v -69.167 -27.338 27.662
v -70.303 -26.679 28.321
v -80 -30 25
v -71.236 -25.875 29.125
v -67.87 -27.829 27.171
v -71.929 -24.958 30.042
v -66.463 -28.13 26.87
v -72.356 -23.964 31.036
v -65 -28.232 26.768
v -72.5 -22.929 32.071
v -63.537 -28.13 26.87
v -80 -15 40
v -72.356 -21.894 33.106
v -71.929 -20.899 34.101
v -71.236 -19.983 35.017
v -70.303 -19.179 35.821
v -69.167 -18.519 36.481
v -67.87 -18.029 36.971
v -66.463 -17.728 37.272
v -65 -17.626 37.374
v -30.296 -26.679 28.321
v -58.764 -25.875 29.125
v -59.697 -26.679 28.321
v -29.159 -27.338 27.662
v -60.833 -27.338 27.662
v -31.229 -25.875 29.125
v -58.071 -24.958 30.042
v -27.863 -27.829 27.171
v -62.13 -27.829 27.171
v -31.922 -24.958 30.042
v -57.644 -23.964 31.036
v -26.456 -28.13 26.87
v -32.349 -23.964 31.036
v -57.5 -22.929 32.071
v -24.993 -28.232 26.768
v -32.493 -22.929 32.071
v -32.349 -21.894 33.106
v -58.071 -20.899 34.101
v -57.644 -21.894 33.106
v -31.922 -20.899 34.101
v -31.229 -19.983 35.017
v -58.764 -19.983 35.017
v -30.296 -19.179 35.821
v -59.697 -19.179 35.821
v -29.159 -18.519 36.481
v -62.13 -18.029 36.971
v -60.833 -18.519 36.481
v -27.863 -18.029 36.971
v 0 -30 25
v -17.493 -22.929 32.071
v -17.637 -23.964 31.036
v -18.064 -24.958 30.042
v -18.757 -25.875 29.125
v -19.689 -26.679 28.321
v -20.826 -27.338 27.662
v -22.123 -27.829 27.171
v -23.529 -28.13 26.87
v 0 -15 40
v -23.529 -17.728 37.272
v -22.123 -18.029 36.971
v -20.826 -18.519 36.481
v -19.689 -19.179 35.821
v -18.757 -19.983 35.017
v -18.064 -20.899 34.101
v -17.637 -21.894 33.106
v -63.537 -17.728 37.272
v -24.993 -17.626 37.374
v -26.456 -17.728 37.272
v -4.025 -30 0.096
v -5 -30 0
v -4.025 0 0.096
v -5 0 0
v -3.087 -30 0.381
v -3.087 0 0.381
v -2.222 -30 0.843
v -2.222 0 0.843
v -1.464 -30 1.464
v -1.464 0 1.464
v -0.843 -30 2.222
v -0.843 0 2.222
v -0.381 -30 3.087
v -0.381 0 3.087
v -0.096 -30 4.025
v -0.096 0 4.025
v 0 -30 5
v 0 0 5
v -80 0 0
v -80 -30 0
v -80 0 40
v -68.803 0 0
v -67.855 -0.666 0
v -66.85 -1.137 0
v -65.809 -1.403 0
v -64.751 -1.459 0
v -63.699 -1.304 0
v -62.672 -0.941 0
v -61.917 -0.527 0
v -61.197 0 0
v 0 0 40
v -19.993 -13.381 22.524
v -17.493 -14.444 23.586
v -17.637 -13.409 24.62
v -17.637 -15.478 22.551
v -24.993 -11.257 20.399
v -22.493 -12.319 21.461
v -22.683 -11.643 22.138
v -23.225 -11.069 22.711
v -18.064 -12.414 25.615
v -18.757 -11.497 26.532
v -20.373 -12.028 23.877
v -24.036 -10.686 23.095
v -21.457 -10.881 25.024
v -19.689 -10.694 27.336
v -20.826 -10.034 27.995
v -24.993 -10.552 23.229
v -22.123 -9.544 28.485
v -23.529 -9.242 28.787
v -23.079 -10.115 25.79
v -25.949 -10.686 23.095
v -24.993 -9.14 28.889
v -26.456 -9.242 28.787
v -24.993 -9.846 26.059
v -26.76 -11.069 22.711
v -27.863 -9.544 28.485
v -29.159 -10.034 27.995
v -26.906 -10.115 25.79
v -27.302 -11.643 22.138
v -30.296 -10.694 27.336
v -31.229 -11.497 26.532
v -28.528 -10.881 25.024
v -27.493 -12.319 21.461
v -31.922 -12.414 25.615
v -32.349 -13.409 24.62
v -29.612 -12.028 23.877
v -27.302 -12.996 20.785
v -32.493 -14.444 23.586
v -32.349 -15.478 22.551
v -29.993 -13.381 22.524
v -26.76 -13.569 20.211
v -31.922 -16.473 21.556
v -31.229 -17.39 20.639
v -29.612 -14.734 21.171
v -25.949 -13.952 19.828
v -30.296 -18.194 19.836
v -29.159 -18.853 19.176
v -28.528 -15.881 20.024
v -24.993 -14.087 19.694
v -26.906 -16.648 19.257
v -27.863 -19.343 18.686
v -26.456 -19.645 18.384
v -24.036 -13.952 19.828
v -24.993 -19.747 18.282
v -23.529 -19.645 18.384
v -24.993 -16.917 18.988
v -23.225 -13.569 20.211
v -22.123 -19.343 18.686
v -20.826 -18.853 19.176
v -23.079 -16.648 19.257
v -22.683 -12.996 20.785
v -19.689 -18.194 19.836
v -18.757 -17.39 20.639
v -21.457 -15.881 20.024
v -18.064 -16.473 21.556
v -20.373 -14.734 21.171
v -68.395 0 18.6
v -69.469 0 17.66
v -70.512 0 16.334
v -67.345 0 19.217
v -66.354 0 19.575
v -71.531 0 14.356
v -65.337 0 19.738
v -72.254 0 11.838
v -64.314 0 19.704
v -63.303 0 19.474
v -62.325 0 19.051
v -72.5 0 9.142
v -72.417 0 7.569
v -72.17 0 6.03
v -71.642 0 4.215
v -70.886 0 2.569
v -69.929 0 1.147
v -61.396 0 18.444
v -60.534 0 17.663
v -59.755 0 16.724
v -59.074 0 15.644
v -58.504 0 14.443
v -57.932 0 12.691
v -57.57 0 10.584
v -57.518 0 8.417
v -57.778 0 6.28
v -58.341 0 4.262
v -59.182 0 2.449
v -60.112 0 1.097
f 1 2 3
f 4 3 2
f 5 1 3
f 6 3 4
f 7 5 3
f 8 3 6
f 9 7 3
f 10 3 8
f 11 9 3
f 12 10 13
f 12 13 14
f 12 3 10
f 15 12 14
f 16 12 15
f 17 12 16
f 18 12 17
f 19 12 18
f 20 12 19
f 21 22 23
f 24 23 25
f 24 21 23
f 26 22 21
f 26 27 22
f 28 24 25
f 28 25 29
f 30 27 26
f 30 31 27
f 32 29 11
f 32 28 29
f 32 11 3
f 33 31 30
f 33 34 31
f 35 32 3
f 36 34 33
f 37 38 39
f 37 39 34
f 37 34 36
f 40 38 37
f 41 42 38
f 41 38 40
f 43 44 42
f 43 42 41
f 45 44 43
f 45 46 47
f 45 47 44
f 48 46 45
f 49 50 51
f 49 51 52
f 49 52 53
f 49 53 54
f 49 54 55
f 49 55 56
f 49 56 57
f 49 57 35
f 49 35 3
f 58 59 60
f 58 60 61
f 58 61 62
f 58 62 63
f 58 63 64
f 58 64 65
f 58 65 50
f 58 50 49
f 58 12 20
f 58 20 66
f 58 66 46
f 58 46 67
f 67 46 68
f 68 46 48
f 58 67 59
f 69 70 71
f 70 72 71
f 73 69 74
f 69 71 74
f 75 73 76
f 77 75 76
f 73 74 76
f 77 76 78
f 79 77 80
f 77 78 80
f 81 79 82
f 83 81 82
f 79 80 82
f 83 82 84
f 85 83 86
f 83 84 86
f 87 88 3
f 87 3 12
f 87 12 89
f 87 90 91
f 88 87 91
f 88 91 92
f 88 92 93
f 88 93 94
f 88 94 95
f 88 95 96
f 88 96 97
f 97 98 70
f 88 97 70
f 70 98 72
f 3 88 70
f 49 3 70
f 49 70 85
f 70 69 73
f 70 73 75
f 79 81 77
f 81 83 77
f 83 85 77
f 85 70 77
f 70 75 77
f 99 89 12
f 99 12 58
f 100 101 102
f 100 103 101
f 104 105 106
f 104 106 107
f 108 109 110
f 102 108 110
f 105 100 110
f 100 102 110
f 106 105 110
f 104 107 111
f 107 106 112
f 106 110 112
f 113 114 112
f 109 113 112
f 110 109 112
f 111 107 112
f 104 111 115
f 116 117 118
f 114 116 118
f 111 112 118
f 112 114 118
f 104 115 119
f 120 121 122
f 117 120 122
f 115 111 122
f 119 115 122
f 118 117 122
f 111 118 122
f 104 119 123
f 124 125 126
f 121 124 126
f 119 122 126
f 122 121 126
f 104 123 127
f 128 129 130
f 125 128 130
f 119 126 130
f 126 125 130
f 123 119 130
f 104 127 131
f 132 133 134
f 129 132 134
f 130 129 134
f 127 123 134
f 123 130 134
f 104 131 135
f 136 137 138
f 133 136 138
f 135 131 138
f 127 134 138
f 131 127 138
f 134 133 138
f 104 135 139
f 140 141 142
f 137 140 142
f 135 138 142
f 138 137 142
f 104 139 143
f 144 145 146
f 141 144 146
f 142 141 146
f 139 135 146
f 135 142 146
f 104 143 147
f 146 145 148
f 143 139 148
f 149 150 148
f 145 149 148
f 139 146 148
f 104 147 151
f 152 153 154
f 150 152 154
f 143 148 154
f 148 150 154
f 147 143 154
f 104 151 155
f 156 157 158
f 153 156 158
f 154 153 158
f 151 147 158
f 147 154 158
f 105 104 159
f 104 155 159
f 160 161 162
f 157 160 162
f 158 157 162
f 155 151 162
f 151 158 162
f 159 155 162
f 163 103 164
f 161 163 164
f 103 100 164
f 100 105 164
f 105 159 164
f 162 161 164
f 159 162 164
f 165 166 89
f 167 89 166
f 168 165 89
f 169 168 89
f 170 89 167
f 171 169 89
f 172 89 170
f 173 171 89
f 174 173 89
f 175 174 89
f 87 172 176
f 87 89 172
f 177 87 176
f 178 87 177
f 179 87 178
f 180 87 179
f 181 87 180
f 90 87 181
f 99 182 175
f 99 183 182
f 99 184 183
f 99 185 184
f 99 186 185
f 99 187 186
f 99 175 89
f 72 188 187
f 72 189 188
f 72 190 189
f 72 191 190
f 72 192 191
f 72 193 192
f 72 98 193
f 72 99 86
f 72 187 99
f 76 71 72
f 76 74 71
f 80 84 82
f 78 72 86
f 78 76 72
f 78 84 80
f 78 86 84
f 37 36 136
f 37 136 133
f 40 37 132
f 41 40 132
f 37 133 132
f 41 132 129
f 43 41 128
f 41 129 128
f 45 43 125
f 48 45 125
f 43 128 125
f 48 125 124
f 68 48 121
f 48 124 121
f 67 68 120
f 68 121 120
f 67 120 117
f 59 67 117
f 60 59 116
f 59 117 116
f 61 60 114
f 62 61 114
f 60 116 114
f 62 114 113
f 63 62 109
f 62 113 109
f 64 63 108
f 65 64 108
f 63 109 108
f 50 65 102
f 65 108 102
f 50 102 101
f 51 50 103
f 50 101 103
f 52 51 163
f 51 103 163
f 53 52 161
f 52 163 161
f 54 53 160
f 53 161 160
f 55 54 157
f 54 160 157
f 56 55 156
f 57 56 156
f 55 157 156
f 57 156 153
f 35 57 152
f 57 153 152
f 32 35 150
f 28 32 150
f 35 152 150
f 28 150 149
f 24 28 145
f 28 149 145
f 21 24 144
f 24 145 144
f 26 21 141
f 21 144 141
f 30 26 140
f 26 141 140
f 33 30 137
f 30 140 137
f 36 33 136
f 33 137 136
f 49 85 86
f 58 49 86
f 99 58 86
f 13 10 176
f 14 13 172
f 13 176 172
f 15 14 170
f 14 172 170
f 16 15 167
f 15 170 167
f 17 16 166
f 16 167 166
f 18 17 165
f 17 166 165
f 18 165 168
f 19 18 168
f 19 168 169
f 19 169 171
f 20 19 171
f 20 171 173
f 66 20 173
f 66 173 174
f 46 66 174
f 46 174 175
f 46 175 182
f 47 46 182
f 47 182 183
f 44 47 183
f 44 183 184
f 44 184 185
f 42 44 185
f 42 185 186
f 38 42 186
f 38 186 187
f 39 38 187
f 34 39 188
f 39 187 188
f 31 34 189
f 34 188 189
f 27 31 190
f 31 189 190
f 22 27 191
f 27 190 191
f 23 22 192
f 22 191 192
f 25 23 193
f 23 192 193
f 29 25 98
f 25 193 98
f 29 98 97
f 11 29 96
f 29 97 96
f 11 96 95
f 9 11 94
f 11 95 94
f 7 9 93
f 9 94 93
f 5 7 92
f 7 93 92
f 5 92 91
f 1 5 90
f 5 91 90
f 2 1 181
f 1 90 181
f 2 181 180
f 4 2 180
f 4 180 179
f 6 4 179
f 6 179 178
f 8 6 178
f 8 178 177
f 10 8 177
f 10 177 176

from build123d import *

# Parameters (mm, degrees)
F0_W     = 80
F0_H     = 30
F1_DEPTH = 40
F2_SIZE  = 15
F4_D     = 15
F6_D     = 15
F6_DEPTH = 12
F6_TIP   = 4.5064546427
F7_R     = 5


with BuildPart() as f1:
    # F0 (on Top) → F1 (new body)
    with BuildSketch(Plane.XY):
        with Locations((-40, -15)):
            Rectangle(F0_W, F0_H)
    extrude(amount=F1_DEPTH)

    # F2
    f2_edges = [f1.edges().sort_by_distance(p)[0] for p in [
        (-40, -30, 40),
    ]]
    chamfer(f2_edges, length=F2_SIZE)

    # F4 (through all)
    with Locations(Plane(origin=(0, -27.5, 27.5), x_dir=(1, 0, 0), z_dir=(0, -0.7071067812, 0.7071067812))):
        with Locations((-65, 6.4644660941)):
            Hole(F4_D / 2)

    # F6
    with Locations(Plane(origin=(0, -27.5, 27.5), x_dir=(1, 0, 0), z_dir=(0, -0.7071067812, 0.7071067812))):
        with Locations((-24.9926396036, 6.4644660941)):
            Hole(F6_D / 2, depth=F6_DEPTH)
            with Locations((0, 0, -(F6_DEPTH + F6_TIP / 2))):  # 118° drill point
                Cone(0, F6_D / 2, F6_TIP, mode=Mode.SUBTRACT)

    # F7
    f7_edges = [f1.edges().sort_by_distance(p)[0] for p in [
        (0, -15, 0),
    ]]
    fillet(f7_edges, radius=F7_R)


solid = f1.part
